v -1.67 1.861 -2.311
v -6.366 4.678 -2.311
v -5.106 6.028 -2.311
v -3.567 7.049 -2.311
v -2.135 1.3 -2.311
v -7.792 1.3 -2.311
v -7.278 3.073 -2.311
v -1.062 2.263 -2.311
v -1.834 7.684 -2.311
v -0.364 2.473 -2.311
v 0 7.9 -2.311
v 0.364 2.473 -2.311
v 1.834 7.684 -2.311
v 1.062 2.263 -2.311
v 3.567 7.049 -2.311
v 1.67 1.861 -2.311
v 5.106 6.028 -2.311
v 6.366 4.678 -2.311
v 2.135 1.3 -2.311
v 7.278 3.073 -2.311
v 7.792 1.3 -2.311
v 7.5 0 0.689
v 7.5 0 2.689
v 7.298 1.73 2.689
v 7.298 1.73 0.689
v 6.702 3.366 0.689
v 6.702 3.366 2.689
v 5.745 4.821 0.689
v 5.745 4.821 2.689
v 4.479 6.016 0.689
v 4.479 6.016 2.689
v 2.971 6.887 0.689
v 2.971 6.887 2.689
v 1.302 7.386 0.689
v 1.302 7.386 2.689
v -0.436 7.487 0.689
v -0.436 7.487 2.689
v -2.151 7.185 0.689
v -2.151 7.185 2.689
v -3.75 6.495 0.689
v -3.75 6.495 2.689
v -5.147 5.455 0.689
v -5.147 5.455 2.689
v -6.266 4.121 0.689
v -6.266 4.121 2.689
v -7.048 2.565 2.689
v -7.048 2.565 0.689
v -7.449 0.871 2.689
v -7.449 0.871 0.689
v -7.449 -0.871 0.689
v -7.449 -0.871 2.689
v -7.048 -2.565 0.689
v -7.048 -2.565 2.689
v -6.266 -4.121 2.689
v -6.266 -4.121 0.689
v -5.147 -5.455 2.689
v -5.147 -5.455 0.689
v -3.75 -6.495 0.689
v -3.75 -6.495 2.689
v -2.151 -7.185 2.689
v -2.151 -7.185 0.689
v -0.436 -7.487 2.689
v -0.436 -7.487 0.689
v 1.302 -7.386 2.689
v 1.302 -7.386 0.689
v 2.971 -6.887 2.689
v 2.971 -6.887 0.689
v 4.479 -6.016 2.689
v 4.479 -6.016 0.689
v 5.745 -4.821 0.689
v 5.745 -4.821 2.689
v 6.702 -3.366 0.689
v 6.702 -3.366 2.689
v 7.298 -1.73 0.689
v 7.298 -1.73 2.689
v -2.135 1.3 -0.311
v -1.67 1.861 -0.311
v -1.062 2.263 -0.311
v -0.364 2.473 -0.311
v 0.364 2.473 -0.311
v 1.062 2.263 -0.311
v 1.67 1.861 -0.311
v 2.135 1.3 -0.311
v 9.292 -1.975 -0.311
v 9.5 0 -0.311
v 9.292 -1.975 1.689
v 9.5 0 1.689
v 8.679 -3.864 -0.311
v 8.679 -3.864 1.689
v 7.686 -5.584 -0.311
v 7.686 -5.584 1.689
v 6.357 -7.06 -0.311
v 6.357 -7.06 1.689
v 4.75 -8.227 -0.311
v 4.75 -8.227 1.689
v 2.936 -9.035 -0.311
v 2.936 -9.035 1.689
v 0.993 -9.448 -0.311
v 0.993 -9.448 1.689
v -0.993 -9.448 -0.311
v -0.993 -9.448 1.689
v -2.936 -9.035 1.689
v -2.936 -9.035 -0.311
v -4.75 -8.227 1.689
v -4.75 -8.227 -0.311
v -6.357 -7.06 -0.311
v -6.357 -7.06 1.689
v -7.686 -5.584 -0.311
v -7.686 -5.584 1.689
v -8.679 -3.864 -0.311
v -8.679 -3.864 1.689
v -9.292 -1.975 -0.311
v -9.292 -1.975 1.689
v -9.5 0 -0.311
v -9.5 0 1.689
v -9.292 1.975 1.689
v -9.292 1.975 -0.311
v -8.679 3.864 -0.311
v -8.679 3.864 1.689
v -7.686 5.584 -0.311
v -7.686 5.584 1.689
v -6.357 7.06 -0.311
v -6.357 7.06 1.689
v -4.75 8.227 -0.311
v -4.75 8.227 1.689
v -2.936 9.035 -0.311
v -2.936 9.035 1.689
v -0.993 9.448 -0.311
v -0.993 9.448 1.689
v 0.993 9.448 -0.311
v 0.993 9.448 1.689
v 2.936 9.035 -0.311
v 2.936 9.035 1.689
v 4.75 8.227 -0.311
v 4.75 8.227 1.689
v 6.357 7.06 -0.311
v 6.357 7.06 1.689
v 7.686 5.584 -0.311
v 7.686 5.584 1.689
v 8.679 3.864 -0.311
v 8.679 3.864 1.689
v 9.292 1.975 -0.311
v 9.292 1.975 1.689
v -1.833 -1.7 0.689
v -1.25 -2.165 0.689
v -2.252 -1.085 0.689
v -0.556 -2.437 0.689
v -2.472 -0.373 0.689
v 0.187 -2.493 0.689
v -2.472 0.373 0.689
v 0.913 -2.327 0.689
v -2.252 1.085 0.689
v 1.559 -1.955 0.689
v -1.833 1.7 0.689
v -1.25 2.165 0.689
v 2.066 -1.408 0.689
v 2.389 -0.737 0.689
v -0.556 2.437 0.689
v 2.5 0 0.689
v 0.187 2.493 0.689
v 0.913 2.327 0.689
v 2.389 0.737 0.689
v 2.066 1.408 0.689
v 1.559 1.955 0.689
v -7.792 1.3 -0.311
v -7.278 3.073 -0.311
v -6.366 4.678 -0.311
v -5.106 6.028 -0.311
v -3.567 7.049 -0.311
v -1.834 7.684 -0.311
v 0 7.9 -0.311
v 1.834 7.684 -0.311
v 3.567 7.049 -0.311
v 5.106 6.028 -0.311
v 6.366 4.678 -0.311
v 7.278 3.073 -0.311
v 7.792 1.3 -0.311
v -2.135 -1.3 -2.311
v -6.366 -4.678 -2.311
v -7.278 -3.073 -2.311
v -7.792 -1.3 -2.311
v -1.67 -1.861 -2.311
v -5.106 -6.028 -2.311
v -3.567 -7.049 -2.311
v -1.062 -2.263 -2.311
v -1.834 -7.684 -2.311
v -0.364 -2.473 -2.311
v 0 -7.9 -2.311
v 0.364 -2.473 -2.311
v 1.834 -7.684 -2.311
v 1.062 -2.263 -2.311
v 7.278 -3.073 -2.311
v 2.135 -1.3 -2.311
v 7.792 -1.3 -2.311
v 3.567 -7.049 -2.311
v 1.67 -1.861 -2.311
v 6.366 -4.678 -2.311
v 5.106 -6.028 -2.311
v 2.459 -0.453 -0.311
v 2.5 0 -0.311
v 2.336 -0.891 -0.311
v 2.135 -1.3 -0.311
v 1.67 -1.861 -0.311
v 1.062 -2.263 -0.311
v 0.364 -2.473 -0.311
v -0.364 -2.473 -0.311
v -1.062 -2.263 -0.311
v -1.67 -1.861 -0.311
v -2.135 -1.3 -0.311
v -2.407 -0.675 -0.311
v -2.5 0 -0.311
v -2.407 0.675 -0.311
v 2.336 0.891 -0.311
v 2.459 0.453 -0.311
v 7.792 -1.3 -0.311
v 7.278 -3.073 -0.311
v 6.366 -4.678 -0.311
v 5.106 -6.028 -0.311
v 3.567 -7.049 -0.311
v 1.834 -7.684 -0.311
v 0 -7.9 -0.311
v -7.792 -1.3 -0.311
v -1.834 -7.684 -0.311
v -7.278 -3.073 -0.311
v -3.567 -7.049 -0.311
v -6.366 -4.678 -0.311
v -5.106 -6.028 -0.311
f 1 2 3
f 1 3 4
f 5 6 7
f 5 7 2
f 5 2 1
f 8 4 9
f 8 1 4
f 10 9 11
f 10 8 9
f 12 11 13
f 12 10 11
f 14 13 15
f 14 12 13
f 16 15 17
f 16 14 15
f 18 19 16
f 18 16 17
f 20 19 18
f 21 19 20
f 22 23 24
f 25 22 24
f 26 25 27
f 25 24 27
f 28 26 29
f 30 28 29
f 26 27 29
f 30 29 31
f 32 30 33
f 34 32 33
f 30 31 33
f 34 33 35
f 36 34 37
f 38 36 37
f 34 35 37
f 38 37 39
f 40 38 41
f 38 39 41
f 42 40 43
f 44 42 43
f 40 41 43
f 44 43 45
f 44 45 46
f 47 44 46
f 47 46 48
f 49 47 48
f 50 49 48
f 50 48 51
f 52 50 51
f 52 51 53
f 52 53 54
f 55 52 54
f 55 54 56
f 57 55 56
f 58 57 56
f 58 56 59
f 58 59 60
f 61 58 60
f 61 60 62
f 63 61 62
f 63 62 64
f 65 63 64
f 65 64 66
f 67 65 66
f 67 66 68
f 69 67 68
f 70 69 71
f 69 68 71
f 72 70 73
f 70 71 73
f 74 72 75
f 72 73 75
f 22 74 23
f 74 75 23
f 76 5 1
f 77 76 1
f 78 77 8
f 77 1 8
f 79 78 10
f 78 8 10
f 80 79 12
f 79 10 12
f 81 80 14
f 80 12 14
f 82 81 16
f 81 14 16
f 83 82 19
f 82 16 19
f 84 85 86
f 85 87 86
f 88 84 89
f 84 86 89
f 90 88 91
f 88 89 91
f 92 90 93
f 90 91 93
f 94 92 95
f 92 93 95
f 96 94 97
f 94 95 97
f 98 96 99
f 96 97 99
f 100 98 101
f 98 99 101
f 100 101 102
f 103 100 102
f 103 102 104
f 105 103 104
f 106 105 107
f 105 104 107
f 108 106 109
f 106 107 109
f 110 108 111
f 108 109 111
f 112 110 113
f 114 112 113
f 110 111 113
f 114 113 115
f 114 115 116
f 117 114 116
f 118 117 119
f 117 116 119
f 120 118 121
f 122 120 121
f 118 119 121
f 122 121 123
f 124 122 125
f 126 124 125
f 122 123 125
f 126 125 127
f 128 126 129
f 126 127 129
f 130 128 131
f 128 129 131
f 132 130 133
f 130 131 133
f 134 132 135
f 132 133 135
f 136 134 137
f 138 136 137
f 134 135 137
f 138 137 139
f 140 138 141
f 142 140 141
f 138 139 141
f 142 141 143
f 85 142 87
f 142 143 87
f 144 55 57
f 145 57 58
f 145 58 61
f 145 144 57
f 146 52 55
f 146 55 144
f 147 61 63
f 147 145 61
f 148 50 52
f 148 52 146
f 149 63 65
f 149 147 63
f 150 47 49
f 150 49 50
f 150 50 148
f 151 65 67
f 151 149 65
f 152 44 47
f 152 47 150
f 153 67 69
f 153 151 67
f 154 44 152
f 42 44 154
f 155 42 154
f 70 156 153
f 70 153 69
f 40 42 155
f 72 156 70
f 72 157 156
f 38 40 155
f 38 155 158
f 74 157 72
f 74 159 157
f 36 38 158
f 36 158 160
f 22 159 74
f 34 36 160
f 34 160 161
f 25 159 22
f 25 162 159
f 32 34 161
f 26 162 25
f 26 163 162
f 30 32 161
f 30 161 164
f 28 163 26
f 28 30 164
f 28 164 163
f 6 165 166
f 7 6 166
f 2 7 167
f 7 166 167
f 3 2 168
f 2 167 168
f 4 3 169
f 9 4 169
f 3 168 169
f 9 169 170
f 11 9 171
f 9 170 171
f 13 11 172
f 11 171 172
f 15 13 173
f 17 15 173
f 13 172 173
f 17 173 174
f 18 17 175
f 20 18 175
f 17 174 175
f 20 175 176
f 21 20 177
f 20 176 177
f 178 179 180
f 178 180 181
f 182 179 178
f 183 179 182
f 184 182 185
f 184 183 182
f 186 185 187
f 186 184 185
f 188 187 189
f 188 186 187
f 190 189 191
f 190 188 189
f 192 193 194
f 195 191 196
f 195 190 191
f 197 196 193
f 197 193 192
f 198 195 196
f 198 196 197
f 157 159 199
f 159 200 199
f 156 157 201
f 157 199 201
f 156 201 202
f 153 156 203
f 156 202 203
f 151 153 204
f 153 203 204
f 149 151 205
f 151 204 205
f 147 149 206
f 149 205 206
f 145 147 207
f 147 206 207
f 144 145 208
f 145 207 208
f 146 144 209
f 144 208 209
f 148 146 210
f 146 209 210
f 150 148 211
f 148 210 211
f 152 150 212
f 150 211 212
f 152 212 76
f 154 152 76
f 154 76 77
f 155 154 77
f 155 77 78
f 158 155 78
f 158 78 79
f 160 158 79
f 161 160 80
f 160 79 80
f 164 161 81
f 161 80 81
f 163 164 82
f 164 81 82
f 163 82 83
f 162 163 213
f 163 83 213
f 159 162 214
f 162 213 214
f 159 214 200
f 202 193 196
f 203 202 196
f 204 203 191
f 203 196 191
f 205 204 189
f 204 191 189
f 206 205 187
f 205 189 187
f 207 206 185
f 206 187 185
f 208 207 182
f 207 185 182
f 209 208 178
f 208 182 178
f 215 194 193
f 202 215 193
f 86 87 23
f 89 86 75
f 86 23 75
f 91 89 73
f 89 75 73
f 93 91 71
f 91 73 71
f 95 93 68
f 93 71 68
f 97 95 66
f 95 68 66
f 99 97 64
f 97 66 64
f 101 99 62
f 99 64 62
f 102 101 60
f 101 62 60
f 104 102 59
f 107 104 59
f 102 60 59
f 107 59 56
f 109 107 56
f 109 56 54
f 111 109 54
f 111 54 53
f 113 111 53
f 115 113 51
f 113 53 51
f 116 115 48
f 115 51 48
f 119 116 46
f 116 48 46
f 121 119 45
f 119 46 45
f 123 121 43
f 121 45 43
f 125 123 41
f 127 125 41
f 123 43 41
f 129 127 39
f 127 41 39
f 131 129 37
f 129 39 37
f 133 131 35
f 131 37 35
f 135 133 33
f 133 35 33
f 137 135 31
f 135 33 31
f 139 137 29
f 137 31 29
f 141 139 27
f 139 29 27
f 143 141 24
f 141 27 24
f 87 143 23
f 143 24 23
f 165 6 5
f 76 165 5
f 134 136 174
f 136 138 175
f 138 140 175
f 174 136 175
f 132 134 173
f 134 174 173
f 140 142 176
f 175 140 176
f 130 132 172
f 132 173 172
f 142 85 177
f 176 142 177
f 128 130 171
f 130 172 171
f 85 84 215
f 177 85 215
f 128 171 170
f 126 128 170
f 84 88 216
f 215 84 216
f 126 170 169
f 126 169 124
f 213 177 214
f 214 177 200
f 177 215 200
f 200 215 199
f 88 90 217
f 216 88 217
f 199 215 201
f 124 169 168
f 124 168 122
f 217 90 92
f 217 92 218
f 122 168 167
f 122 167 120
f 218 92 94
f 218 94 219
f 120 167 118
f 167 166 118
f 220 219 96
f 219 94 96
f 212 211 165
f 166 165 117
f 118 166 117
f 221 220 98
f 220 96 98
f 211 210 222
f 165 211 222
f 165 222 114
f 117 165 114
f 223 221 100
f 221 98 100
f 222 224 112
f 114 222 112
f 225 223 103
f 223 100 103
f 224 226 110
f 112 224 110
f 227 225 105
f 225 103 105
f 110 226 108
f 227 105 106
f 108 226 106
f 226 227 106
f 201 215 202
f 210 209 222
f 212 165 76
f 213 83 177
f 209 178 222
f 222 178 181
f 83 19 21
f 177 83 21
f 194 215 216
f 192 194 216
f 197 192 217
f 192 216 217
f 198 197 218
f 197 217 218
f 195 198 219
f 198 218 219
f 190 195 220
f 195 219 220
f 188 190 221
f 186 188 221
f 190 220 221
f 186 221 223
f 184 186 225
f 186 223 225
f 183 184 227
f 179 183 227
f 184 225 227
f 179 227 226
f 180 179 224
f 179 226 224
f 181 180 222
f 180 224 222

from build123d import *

# Parameters (mm, degrees)
F2_R     = 7.9
F3_DEPTH = 2
F5_DEPTH = 2
F6_R     = 7.5
F7_DEPTH = 2
F8_DEPTH = 1


with BuildPart() as f1:
    # F0 (on Front) → F1 (revolve)
    with BuildSketch(Plane.XZ):
        Polygon((2.5, 2.6889840401), (2.5, -0.3110159599), (9.5, -0.3110159599), (9.5, 1.6889840401), (7.5, 2.6889840401), align=None)
    revolve(axis=Axis((0, 0, 1.1889840401), (0, 0, -1)))

    # F2 (on face) → F3 (join)
    with BuildSketch(Plane(origin=(0, 0, -0.3110159599), x_dir=(1, 0, 0), z_dir=(0, 0, -1))):
        Circle(F2_R)
    extrude(amount=F3_DEPTH)

    # F4 (on face) → F5 (cut)
    with BuildSketch(Plane(origin=(0, 0, -2.3110159599), x_dir=(1, 0, 0), z_dir=(0, 0, -1))):
        with BuildLine():
            ThreePointArc((2.1354156504, -1.3), (2.4071289045, -0.675078097), (2.5, 0))
            ThreePointArc((2.5, 0), (2.4071289045, 0.675078097), (2.1354156504, 1.3))
            Line((2.1354156504, 1.3), (-2.1354156504, 1.3))
            ThreePointArc((-2.1354156504, 1.3), (-2.5, 0), (-2.1354156504, -1.3))
            Line((-2.1354156504, -1.3), (2.1354156504, -1.3))
        make_face()
        with BuildLine():
            ThreePointArc((2.1354156504, 1.3), (2.4071289045, 0.675078097), (2.5, 0))
            ThreePointArc((2.5, 0), (2.4071289045, -0.675078097), (2.1354156504, -1.3))
            Line((2.1354156504, -1.3), (8.2728397101, -1.3))
            Line((8.2728397101, -1.3), (8.2728397101, 1.3))
            Line((8.2728397101, 1.3), (2.1354156504, 1.3))
        make_face()
        with BuildLine():
            Line((-2.1354156504, 1.3), (2.1354156504, 1.3))
            ThreePointArc((2.1354156504, 1.3), (0, 2.5), (-2.1354156504, 1.3))
        make_face()
        with BuildLine():
            ThreePointArc((-2.1354156504, -1.3), (0, -2.5), (2.1354156504, -1.3))
            Line((2.1354156504, -1.3), (-2.1354156504, -1.3))
        make_face()
        with BuildLine():
            ThreePointArc((-2.1354156504, -1.3), (-2.5, 0), (-2.1354156504, 1.3))
            Line((-2.1354156504, 1.3), (-8.2728397101, 1.3))
            Line((-8.2728397101, 1.3), (-8.2728397101, -1.3))
            Line((-8.2728397101, -1.3), (-2.1354156504, -1.3))
        make_face()
    extrude(amount=-F5_DEPTH, mode=Mode.SUBTRACT)

    # F6 (on face) → F7 (cut)
    with BuildSketch(Plane.XY.offset(2.6889840401)):
        Circle(F6_R)
    extrude(amount=-F7_DEPTH, mode=Mode.SUBTRACT)

    # F6 (on face) → F8 (cut)
    with BuildSketch(Plane.XY.offset(2.6889840401)):
        Circle(F6_R)
    extrude(amount=-F8_DEPTH, mode=Mode.SUBTRACT)


solid = f1.part
